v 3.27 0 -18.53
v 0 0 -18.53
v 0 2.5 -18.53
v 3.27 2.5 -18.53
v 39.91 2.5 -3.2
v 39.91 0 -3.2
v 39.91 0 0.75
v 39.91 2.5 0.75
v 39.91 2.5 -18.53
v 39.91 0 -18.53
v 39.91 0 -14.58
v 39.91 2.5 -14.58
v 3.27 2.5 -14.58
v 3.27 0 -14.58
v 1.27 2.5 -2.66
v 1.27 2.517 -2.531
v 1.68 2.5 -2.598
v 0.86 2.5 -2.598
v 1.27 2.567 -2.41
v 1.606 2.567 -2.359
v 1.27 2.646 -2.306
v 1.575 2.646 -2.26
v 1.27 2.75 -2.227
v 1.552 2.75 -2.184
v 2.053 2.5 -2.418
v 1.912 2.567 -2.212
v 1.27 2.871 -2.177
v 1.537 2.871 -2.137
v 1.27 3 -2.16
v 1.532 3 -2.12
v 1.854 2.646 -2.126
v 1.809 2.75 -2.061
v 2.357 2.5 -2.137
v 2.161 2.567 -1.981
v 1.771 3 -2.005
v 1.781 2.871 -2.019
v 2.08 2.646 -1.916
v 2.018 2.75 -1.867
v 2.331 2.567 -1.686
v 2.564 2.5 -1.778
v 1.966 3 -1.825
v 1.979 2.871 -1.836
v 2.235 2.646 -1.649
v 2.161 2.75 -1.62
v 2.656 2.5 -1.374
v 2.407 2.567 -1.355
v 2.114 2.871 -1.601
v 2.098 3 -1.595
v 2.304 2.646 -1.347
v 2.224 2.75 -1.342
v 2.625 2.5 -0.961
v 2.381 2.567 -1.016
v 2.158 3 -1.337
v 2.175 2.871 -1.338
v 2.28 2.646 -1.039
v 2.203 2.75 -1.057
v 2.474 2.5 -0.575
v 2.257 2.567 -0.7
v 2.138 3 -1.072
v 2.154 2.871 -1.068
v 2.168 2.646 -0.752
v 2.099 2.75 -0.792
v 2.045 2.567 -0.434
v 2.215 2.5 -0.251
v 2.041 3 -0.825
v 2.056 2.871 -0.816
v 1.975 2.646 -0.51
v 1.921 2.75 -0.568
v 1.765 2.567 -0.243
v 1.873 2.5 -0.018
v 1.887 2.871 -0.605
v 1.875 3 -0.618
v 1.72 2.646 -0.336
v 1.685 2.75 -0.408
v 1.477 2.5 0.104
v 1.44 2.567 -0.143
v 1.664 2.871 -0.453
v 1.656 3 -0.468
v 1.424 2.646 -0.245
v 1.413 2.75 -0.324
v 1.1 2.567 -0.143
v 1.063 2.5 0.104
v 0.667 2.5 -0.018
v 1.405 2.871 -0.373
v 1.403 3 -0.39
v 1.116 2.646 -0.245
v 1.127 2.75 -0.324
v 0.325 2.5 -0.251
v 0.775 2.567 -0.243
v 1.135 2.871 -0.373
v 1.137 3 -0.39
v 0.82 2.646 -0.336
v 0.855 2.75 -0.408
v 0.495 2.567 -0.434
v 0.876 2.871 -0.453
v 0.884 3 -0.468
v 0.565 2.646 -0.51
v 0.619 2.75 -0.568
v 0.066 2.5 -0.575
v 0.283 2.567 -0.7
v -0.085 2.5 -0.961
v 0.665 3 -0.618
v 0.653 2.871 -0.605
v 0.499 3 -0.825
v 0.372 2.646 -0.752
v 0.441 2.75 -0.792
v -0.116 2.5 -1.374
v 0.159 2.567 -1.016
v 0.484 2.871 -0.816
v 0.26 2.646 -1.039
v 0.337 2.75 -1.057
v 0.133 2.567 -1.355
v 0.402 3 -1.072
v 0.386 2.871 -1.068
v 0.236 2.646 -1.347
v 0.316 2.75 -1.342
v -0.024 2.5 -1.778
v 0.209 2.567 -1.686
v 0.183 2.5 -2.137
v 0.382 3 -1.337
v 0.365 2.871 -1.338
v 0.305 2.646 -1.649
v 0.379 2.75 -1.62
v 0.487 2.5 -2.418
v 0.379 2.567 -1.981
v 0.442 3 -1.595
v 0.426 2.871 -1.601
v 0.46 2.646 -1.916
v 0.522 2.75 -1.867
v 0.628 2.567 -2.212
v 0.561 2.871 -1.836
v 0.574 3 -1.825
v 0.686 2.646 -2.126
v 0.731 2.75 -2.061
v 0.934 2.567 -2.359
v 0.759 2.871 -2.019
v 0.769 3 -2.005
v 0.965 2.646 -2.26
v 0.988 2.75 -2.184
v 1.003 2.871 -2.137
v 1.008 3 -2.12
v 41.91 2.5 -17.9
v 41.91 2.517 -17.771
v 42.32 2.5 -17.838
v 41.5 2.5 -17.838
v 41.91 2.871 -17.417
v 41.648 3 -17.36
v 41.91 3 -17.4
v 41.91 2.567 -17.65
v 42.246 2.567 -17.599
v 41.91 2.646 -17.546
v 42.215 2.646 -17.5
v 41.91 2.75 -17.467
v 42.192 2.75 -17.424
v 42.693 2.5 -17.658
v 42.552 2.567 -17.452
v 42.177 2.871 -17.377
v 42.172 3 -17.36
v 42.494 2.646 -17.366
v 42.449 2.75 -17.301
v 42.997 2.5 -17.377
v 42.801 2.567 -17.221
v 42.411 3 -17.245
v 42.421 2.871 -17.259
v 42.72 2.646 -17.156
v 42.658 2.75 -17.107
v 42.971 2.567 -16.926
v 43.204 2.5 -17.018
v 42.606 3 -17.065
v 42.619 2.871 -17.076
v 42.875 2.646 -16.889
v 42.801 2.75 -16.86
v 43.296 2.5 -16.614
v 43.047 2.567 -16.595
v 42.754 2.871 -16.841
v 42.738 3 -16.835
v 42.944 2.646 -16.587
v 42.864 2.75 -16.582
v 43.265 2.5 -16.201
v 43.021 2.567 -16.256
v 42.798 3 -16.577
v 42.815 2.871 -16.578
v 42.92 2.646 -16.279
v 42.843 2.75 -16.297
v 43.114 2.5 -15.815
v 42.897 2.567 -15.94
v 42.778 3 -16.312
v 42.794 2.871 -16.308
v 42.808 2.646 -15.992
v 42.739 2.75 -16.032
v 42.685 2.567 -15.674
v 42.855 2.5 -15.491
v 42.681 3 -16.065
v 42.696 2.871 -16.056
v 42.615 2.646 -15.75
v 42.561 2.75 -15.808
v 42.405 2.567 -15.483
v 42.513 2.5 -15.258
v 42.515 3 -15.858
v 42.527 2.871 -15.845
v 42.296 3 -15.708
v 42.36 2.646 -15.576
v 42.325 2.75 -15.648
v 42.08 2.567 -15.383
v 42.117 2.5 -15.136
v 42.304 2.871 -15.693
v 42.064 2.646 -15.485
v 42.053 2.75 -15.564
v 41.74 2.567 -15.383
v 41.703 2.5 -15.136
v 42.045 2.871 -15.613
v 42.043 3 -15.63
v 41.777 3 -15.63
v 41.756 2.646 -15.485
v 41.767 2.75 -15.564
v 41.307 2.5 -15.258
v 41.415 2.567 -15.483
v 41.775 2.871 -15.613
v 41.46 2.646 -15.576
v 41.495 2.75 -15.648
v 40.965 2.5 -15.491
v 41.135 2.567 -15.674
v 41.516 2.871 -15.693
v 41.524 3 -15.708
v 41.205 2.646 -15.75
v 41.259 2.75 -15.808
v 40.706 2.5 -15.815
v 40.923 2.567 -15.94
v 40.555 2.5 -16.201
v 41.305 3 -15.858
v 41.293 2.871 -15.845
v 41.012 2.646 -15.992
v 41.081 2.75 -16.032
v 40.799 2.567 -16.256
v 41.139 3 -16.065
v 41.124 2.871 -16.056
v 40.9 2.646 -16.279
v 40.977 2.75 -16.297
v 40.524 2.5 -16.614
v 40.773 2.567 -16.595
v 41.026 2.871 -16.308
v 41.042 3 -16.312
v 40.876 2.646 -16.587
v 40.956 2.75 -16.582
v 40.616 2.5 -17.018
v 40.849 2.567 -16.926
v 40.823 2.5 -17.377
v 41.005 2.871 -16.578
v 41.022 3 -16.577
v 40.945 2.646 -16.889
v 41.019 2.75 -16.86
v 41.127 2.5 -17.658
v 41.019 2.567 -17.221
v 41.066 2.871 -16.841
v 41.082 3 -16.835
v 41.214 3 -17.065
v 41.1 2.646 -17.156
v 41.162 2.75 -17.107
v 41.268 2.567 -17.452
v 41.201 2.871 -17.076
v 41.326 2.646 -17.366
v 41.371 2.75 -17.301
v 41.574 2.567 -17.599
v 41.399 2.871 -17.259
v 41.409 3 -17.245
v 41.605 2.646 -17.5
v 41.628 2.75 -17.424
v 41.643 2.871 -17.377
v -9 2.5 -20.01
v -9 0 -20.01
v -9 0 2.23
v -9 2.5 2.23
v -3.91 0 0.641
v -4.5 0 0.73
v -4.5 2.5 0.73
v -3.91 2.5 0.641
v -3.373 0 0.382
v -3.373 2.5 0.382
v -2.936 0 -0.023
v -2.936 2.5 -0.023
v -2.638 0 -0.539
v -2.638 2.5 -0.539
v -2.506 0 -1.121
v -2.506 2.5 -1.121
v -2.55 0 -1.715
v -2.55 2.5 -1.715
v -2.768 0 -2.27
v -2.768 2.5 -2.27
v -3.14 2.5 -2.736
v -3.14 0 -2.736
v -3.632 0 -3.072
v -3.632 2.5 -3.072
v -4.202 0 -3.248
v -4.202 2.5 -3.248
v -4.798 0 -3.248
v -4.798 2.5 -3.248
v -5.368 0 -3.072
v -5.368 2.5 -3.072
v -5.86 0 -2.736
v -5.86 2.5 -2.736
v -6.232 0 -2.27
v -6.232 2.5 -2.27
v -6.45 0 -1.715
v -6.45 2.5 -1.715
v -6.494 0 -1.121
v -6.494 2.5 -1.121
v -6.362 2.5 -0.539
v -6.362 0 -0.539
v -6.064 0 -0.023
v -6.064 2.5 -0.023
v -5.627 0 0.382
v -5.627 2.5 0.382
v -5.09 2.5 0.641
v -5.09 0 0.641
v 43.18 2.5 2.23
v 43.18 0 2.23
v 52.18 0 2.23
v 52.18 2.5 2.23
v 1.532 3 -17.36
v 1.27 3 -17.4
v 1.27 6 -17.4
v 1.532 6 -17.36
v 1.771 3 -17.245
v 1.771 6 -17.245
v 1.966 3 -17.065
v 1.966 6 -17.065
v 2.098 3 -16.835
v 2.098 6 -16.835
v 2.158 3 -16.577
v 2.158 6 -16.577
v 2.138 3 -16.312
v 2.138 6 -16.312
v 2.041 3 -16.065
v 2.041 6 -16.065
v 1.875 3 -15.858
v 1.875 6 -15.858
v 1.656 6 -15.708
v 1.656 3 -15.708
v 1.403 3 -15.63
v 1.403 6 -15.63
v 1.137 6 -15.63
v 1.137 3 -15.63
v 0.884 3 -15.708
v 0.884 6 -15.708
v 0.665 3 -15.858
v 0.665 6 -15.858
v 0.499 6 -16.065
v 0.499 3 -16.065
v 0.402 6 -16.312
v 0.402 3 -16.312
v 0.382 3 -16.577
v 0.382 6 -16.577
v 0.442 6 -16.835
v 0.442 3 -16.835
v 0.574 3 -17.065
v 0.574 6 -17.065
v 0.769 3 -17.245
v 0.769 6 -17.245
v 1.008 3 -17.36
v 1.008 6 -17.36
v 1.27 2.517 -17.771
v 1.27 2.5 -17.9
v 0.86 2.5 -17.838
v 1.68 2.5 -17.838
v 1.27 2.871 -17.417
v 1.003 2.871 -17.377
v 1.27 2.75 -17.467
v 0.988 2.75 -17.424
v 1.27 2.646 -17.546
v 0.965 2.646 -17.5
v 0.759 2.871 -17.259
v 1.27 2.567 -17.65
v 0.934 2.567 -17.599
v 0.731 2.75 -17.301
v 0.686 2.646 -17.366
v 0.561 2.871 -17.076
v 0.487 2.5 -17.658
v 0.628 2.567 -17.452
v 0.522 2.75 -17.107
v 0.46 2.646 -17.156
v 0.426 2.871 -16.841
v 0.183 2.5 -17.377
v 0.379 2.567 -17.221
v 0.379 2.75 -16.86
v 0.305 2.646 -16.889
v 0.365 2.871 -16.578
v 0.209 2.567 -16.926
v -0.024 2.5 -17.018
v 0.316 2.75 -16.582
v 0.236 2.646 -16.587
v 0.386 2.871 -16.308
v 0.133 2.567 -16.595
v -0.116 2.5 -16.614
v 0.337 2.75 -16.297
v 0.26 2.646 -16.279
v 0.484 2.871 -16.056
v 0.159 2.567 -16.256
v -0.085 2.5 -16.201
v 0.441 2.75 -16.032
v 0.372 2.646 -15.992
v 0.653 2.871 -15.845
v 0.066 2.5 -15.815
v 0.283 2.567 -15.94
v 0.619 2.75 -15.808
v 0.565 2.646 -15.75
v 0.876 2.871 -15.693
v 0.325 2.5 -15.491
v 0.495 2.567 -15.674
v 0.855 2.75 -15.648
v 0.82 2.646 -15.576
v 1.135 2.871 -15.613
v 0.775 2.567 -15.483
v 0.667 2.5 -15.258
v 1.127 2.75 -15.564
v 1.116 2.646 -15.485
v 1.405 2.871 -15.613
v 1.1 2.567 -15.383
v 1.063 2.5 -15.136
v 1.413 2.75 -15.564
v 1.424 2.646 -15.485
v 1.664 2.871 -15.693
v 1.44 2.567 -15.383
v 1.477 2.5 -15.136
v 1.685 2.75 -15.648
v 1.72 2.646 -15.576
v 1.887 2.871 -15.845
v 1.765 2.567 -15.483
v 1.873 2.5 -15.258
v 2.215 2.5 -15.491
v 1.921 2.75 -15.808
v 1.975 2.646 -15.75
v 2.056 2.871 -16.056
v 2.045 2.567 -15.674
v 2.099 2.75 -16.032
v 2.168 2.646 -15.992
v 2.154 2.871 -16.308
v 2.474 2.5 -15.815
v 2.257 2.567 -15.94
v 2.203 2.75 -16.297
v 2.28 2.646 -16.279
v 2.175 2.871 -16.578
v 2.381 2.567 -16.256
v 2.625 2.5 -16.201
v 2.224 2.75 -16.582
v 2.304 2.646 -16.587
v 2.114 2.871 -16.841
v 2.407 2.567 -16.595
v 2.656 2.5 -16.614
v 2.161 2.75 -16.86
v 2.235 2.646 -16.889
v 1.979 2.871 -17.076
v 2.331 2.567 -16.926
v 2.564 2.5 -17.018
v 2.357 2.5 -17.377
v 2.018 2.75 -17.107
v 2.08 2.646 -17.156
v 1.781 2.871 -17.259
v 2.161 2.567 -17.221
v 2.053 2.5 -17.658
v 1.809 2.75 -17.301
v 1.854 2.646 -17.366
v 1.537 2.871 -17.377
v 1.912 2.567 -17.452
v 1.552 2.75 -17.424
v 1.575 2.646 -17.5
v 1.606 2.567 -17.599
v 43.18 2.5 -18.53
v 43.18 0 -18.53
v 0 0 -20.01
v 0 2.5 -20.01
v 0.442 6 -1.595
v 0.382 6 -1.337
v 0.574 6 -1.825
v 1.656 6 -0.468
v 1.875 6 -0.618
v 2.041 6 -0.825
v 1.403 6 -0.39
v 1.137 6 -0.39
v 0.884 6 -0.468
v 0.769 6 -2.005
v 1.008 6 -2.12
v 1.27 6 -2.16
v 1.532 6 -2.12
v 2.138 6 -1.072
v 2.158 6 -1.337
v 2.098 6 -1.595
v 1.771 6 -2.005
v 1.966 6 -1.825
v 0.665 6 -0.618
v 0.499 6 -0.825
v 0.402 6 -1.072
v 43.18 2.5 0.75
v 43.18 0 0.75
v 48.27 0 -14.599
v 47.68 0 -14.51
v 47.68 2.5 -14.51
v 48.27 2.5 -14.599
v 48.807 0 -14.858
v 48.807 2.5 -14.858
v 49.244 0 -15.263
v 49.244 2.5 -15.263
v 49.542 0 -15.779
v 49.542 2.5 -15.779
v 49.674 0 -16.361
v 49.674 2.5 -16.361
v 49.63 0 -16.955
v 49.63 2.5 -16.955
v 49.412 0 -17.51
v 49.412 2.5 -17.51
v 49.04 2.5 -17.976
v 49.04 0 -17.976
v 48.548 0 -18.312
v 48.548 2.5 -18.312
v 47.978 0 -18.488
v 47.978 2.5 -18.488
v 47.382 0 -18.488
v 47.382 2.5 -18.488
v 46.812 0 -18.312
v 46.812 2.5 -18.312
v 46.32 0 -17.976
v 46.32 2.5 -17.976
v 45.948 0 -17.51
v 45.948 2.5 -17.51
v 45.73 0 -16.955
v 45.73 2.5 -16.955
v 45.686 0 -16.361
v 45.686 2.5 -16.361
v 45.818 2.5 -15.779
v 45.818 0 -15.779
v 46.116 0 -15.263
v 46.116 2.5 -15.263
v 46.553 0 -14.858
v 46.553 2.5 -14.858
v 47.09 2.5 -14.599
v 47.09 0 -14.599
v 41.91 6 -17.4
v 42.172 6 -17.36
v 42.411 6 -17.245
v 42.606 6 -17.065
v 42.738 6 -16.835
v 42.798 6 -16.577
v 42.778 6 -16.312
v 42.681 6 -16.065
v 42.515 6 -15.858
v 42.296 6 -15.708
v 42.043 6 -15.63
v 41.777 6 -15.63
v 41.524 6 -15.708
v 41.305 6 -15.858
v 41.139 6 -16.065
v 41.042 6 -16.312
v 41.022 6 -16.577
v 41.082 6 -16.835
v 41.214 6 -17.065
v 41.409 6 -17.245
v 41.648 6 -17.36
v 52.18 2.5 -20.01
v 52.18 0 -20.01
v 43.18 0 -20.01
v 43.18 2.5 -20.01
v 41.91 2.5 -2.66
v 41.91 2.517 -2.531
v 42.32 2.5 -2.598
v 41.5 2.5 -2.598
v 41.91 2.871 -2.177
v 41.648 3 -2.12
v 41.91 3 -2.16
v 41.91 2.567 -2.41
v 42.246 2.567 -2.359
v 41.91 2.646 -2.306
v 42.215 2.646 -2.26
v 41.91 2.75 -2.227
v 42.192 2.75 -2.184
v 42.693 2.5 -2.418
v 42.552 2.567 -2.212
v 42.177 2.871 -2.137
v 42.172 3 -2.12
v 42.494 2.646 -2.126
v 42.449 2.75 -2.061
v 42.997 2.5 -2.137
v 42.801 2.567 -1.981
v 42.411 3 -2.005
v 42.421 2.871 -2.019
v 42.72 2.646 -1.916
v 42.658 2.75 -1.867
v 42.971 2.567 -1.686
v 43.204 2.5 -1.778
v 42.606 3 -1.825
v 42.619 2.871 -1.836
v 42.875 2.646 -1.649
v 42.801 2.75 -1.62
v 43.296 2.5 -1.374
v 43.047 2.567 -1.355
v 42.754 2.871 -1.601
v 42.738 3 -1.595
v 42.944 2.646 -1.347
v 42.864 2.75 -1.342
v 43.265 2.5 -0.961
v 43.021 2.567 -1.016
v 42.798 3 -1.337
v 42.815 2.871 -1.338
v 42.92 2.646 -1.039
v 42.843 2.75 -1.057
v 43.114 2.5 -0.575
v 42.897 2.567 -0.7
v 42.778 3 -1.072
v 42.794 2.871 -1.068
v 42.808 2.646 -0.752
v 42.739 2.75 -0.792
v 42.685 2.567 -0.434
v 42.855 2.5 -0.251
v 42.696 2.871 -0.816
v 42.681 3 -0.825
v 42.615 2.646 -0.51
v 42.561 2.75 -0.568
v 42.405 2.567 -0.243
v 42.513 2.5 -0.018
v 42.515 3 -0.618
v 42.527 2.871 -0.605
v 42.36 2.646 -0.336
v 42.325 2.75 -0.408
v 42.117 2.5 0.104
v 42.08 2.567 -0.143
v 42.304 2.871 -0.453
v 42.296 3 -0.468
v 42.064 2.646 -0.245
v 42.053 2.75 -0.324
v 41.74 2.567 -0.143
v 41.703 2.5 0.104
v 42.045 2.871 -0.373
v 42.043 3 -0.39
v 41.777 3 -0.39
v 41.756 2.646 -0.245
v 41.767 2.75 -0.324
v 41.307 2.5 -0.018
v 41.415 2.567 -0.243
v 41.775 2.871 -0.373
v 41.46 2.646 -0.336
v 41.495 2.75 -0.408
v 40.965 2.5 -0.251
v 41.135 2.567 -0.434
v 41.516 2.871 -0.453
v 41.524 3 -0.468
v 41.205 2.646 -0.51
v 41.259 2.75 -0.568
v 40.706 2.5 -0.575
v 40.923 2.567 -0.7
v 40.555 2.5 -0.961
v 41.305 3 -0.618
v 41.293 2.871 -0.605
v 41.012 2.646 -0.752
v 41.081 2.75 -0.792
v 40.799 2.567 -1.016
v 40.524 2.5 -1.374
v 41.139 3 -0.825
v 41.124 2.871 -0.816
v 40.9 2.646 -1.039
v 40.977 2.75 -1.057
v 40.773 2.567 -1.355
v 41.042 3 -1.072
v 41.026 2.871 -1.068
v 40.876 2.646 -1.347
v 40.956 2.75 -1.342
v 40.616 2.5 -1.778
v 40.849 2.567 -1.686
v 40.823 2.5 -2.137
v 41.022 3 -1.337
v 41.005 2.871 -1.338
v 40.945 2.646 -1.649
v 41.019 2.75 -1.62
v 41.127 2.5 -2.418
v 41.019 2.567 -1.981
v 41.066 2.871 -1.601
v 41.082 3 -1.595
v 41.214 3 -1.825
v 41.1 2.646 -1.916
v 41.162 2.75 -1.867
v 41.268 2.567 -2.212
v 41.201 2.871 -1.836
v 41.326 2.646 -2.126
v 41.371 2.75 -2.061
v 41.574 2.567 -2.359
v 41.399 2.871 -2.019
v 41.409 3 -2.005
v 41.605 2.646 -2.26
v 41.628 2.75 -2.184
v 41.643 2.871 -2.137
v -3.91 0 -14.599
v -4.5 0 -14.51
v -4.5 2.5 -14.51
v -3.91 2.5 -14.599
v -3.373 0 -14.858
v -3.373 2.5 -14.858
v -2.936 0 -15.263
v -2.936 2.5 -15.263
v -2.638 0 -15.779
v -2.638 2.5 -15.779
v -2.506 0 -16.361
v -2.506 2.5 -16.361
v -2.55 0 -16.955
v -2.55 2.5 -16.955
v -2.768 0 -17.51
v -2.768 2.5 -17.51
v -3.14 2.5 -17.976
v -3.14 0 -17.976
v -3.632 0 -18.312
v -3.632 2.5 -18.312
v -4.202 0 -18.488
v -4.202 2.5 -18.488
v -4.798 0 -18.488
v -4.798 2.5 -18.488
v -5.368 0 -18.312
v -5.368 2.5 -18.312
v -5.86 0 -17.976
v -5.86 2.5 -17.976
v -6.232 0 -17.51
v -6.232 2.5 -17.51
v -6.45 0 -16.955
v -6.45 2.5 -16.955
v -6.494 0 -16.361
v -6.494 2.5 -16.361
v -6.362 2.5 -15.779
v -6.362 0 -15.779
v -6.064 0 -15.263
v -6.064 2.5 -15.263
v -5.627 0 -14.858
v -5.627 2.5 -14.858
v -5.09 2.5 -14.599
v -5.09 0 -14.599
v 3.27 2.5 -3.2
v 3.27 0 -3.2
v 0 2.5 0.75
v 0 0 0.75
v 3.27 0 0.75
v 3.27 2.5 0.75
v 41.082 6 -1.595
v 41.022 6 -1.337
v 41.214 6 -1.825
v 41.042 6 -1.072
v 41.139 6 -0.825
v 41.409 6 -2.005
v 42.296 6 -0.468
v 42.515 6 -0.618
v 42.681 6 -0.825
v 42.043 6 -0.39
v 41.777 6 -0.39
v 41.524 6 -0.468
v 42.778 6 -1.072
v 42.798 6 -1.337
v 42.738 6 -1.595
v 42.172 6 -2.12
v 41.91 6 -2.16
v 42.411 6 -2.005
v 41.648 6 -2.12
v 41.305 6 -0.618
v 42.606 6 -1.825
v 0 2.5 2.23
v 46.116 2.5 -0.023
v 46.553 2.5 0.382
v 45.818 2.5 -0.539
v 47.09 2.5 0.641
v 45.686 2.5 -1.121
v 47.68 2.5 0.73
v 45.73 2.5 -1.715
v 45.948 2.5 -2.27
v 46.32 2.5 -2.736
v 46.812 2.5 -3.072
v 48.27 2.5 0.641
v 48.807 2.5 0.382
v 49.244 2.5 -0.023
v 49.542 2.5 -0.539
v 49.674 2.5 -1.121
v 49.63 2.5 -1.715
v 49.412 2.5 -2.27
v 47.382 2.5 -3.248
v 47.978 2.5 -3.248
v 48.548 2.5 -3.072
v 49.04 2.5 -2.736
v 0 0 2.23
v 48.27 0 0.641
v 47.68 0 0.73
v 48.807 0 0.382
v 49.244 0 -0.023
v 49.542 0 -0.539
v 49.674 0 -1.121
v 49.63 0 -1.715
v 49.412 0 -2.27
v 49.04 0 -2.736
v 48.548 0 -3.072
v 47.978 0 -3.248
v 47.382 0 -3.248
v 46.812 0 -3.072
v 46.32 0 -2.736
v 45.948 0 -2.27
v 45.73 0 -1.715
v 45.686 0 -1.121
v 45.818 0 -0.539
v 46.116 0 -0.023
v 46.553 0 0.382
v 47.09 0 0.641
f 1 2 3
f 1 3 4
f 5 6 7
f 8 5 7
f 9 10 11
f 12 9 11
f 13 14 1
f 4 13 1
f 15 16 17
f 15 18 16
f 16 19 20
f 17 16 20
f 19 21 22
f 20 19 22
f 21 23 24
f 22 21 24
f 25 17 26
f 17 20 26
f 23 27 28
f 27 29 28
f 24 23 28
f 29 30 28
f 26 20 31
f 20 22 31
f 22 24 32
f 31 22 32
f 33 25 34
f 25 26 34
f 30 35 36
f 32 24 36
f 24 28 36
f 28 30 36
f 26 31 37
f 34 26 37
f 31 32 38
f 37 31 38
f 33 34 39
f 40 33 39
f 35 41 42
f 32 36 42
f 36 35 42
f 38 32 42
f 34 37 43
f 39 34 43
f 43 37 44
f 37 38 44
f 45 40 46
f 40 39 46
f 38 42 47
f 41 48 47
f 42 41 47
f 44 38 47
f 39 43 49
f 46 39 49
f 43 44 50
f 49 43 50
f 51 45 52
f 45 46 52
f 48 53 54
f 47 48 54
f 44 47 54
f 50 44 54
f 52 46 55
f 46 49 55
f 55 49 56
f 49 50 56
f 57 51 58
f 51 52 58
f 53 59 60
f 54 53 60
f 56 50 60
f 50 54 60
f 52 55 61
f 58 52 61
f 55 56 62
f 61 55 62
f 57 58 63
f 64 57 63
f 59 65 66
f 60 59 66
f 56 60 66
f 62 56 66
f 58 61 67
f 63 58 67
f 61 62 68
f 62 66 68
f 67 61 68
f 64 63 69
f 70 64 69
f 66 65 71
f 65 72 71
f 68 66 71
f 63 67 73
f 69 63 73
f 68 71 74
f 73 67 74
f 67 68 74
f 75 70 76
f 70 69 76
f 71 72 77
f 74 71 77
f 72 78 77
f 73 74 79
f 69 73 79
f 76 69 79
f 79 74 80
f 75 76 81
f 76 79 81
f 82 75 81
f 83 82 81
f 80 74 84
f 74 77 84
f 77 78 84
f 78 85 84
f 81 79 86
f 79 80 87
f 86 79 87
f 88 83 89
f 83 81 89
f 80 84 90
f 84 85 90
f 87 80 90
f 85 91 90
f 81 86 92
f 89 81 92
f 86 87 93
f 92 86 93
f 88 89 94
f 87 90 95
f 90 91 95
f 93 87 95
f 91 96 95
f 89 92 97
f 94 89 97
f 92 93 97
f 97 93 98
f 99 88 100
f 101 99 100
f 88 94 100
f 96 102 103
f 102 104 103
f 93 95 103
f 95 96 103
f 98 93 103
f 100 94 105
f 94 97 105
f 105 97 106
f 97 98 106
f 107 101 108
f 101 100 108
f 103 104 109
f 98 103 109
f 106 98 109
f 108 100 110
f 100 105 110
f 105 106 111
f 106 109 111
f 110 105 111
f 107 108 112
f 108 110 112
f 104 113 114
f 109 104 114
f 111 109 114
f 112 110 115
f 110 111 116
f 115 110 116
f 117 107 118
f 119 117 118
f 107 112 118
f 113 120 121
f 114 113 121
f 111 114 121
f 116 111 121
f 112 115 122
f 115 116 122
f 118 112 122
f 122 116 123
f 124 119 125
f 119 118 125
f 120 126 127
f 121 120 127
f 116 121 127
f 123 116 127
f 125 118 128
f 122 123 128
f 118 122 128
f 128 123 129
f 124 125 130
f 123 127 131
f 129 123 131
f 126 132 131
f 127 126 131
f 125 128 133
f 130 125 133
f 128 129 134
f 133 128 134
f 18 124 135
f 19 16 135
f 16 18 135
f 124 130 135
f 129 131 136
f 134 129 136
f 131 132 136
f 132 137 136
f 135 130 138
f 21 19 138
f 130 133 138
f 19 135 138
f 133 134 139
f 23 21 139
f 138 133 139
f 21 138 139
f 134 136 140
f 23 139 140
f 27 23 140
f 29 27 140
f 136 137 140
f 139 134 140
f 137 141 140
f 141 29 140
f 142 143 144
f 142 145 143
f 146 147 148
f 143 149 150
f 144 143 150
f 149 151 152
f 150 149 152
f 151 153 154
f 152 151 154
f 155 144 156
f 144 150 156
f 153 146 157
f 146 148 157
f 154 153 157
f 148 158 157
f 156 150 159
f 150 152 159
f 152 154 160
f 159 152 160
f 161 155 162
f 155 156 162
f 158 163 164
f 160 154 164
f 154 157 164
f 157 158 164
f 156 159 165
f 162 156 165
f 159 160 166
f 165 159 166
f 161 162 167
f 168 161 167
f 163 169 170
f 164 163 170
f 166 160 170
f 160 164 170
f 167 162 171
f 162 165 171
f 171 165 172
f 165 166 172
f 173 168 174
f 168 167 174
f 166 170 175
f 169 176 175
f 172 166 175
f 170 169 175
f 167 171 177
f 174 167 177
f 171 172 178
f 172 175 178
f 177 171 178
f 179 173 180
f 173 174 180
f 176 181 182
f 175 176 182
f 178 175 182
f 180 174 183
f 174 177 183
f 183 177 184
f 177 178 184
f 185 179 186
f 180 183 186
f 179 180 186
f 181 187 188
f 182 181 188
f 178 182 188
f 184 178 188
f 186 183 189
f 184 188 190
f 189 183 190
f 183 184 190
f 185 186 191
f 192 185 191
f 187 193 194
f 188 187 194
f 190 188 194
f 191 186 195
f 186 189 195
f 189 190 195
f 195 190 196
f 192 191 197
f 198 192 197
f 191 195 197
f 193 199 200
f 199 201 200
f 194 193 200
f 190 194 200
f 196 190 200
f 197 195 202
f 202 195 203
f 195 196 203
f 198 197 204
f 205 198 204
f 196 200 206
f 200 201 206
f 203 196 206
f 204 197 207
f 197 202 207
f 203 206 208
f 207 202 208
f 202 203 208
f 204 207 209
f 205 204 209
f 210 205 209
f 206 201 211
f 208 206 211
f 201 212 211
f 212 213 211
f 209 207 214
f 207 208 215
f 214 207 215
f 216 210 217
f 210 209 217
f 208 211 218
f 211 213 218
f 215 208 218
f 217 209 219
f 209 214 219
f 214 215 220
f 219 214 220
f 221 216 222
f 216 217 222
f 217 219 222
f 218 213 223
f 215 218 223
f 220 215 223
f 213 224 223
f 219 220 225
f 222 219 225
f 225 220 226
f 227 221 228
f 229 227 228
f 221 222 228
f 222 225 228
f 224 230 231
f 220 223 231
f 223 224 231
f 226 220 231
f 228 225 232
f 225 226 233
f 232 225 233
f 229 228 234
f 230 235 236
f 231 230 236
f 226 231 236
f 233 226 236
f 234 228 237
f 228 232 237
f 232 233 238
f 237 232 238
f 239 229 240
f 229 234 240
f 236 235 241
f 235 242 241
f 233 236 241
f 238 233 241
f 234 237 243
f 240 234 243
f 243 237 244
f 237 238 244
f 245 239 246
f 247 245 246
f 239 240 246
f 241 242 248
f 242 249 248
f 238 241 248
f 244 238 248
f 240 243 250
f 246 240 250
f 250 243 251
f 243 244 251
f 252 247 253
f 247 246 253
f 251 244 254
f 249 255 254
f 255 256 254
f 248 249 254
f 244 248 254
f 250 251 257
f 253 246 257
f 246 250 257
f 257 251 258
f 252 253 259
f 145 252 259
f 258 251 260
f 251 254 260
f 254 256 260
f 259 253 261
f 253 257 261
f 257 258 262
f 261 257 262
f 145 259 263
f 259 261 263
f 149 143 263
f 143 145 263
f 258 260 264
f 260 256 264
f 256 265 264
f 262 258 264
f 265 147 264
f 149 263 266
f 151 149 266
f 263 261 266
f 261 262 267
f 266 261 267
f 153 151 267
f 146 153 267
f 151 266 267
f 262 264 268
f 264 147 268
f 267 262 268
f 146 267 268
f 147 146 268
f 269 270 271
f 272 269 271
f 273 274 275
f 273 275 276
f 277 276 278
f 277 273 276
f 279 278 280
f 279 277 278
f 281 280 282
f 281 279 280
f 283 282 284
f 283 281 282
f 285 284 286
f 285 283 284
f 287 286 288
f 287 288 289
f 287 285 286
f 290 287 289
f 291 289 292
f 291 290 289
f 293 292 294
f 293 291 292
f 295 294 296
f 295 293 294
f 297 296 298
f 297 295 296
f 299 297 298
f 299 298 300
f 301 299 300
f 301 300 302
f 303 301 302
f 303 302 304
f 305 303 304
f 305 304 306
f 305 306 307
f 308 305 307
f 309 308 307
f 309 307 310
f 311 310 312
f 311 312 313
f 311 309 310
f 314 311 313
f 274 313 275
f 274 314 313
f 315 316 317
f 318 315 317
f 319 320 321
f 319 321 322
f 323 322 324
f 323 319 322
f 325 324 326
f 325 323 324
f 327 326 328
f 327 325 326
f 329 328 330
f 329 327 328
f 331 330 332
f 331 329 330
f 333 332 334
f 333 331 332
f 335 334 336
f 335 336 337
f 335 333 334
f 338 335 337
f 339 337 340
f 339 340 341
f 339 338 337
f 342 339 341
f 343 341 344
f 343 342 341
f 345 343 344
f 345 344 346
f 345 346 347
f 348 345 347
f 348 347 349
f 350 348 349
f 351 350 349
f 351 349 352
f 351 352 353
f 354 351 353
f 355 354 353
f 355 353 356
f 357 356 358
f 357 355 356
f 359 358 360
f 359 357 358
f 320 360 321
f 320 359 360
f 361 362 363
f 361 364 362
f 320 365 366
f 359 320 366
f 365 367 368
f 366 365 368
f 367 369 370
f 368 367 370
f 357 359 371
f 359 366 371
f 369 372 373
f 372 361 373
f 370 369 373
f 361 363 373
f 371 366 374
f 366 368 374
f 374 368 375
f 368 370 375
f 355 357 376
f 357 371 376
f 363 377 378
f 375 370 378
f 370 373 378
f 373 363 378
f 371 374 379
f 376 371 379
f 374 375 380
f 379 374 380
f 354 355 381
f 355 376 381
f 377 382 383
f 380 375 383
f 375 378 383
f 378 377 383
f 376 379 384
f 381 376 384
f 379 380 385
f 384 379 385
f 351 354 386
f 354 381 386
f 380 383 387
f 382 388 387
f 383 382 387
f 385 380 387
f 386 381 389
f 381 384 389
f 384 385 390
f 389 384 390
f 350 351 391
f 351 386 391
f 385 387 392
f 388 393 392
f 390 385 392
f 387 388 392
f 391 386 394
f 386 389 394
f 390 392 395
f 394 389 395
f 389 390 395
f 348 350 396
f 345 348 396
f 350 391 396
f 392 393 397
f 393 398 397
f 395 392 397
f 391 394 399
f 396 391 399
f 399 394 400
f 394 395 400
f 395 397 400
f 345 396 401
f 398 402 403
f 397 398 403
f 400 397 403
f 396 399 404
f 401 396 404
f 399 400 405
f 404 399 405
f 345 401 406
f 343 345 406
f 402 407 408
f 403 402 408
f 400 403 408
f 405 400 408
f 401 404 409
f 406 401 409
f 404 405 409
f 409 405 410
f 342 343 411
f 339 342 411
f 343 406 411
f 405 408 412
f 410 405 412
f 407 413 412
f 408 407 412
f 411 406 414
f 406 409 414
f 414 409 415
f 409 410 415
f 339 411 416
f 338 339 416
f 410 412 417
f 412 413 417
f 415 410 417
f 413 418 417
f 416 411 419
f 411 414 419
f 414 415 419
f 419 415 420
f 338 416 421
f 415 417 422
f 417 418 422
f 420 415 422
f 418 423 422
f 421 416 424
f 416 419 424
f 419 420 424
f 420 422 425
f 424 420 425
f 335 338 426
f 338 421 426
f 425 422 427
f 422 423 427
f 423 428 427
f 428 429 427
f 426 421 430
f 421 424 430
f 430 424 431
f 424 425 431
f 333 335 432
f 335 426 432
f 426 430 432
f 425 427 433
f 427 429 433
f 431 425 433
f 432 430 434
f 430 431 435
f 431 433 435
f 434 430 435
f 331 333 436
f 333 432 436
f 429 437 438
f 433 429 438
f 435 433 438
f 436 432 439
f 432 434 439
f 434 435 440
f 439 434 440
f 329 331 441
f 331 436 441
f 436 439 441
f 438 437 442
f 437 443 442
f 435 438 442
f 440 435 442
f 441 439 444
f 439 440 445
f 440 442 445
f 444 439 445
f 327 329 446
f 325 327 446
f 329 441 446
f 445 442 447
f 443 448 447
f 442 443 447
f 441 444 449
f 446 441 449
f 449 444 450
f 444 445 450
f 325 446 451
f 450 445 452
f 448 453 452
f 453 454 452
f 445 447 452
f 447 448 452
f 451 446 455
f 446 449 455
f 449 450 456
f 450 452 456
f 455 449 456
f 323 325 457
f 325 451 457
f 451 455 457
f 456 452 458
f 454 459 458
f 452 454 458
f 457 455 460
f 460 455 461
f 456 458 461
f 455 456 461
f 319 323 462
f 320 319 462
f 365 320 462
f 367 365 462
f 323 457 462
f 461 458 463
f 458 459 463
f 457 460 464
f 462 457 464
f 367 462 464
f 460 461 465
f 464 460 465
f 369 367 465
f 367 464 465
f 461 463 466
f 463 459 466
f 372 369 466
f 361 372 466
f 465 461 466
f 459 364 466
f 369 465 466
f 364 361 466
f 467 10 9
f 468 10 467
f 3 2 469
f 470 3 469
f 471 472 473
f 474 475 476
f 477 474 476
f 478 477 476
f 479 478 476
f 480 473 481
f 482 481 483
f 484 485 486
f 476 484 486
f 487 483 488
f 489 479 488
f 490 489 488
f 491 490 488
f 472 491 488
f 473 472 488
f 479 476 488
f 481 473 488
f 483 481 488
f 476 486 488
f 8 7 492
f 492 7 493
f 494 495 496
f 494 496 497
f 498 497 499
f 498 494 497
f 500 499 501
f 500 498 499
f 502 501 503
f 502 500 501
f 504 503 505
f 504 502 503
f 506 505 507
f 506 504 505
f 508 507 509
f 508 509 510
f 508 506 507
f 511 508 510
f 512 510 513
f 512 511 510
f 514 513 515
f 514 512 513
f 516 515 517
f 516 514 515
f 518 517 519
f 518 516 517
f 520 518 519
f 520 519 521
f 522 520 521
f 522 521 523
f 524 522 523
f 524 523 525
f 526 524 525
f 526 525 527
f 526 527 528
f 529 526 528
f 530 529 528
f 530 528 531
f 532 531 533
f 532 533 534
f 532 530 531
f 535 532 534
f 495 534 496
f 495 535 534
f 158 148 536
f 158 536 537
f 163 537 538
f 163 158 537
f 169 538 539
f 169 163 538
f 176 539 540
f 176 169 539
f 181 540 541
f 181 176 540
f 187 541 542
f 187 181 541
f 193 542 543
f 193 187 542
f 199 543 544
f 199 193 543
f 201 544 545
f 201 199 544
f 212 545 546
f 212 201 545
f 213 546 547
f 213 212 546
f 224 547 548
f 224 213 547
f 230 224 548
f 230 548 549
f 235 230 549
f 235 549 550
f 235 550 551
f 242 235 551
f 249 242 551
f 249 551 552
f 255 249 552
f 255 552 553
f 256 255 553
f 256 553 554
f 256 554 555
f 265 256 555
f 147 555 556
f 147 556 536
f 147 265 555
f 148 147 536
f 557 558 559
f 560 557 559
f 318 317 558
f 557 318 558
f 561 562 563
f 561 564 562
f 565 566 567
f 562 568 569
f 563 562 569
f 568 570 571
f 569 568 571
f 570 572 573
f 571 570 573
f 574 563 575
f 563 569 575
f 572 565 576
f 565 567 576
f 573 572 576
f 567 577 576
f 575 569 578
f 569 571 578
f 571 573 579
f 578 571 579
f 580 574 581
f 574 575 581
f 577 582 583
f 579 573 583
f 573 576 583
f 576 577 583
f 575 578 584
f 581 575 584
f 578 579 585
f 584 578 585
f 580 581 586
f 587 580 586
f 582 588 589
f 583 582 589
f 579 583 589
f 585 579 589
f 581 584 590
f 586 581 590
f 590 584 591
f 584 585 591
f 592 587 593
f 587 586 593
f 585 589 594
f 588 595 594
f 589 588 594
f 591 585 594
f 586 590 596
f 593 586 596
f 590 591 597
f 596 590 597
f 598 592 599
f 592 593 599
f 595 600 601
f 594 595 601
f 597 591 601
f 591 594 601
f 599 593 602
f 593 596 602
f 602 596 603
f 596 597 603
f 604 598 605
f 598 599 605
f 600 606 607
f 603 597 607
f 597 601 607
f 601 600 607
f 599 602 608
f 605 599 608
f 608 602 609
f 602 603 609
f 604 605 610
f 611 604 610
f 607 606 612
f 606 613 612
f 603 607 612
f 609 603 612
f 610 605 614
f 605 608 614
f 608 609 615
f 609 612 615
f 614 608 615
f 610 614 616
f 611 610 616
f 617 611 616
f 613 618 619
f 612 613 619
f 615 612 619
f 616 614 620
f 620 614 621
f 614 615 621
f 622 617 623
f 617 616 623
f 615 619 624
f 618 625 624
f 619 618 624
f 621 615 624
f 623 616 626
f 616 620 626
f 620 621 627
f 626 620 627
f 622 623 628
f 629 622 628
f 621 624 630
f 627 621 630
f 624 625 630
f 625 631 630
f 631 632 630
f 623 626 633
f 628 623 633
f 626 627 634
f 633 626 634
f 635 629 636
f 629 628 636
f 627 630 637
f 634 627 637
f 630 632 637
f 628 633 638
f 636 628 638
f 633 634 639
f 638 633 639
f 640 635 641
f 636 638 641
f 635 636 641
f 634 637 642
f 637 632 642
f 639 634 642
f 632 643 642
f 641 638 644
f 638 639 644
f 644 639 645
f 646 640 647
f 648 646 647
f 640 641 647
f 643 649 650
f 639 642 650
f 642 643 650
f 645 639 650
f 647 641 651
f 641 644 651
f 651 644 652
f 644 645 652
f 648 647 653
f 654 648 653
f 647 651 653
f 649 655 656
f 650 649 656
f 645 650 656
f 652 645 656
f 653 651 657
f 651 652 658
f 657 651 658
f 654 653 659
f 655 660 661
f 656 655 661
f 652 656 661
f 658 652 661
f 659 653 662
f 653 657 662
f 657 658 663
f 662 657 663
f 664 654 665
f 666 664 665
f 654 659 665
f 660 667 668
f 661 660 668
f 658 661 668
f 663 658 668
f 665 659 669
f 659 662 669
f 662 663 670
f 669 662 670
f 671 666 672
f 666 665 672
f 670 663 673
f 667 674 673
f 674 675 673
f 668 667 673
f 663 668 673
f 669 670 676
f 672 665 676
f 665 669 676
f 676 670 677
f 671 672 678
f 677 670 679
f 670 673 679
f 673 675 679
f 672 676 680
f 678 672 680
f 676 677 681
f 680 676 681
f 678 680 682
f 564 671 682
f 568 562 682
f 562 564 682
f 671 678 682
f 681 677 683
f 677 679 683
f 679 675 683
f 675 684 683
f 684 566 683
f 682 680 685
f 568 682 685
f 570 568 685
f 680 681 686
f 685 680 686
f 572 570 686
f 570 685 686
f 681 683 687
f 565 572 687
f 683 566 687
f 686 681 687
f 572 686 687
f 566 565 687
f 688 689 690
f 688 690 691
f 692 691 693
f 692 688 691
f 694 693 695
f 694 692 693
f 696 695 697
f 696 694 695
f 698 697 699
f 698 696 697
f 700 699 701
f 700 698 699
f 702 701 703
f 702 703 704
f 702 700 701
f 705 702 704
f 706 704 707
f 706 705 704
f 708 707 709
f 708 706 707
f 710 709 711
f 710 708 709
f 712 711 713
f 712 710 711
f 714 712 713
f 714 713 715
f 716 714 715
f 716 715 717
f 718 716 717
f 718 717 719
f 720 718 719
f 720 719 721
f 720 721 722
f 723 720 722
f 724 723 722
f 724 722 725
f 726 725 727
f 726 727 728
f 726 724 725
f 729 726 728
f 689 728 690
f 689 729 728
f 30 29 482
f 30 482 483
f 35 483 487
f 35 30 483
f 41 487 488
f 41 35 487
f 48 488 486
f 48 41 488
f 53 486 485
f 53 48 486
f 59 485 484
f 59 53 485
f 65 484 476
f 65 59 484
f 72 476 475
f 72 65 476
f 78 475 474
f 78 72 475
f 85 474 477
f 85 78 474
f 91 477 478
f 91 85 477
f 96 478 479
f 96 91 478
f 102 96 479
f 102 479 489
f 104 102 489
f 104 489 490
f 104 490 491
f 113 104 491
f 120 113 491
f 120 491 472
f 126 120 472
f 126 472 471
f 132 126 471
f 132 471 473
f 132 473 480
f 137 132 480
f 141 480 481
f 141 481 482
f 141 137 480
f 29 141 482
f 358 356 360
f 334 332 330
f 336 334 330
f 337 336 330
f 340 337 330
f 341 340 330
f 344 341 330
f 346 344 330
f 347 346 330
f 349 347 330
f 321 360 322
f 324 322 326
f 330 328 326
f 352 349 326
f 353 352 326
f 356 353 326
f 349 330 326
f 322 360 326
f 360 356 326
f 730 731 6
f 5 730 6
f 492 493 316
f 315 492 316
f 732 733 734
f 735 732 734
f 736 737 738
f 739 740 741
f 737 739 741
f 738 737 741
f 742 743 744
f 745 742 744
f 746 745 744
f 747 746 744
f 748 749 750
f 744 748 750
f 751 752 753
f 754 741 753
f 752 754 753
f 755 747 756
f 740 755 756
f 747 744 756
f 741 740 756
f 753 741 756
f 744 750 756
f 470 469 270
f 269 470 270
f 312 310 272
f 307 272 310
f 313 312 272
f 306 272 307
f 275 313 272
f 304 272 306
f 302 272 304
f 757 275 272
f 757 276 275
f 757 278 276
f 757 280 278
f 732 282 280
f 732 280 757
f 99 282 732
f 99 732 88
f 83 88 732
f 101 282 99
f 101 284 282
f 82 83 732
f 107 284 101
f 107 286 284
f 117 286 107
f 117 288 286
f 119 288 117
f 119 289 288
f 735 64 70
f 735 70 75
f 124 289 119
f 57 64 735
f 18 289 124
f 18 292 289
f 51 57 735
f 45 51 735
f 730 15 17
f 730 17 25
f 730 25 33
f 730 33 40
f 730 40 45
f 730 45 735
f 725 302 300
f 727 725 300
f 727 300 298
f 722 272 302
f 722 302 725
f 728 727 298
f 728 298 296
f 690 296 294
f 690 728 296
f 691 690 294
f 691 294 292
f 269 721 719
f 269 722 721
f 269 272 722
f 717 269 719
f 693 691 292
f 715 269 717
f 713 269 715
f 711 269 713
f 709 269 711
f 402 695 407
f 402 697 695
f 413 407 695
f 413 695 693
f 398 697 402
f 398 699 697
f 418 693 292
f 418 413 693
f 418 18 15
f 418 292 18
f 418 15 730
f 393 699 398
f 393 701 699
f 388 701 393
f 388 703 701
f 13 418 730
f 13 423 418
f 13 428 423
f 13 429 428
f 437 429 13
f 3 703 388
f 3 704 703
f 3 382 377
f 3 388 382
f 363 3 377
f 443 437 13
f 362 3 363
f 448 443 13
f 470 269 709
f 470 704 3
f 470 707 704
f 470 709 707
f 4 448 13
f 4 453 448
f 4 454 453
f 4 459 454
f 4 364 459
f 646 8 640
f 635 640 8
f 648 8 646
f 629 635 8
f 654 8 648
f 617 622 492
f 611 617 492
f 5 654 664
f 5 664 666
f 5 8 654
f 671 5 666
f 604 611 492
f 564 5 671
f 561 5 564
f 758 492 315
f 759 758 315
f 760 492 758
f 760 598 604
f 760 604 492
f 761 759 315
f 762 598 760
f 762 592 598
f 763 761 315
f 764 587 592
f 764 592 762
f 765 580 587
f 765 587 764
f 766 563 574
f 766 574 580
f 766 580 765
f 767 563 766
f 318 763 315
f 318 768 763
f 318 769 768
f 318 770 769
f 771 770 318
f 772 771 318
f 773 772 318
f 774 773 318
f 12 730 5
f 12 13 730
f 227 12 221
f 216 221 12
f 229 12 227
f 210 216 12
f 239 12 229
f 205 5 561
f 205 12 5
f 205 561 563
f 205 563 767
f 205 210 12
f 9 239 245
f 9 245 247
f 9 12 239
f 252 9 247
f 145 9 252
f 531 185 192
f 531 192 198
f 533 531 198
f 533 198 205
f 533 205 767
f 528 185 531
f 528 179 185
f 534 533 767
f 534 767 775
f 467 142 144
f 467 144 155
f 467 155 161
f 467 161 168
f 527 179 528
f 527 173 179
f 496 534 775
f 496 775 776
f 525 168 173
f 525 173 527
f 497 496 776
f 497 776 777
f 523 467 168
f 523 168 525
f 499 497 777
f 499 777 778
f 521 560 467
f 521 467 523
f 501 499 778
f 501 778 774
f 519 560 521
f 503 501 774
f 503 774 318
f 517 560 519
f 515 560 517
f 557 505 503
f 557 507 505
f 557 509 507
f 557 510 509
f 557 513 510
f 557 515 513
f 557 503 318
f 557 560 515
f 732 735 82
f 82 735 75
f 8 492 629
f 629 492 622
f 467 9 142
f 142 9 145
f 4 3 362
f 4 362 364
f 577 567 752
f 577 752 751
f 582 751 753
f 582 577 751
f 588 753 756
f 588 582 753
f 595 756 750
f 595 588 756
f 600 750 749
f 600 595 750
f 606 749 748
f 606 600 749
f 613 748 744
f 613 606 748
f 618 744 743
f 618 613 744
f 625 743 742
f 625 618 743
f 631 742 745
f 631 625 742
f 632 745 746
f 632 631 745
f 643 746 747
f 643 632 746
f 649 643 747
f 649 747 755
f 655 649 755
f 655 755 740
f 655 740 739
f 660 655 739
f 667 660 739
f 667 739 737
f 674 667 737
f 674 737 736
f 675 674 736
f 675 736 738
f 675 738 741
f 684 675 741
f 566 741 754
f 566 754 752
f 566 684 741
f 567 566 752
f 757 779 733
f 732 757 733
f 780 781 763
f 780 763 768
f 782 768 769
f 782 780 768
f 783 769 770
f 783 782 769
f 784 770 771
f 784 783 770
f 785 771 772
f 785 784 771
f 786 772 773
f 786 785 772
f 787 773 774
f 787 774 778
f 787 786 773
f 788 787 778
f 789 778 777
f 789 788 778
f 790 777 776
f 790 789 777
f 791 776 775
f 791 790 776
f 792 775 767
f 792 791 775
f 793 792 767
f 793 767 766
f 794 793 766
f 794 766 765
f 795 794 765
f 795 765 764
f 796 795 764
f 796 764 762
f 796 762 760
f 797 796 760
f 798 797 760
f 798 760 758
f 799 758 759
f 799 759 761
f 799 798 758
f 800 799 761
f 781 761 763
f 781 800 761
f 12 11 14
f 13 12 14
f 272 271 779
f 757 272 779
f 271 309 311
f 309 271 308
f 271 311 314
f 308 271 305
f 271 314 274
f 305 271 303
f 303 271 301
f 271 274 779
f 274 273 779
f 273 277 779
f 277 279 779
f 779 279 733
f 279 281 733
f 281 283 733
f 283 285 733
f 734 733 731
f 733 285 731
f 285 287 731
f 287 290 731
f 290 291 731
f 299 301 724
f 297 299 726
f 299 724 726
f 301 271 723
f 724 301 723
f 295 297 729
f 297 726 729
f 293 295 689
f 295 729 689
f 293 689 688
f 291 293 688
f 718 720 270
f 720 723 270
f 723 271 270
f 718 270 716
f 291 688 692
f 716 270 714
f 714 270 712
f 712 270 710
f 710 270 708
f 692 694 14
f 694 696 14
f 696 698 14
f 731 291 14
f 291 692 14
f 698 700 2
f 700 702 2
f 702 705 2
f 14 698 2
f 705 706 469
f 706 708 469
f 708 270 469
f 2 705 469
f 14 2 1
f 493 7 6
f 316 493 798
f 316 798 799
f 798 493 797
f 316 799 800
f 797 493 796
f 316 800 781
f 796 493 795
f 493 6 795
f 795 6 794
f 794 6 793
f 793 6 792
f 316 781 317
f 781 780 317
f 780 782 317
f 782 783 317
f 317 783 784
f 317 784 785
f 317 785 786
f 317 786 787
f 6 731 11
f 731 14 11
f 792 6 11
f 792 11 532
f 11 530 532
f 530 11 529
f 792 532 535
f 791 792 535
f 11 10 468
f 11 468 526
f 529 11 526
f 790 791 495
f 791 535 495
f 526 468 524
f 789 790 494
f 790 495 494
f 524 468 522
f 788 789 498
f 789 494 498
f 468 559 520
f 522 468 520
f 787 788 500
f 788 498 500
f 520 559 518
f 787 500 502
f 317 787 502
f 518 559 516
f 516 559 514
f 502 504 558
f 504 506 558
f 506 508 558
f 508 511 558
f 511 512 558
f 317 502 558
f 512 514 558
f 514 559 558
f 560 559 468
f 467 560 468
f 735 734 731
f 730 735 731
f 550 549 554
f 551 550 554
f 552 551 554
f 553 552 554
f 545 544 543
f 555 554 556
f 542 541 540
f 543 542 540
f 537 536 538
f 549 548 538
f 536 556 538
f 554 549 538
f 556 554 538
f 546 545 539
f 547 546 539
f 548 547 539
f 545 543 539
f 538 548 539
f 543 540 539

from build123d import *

# Parameters (mm, degrees)
SKETCH1_R           = 0.89
SKETCH1_R_2         = 2
SKETCH1_W           = 3.27
SKETCH1_H           = 0.75
BOSS_EXTRUDE1_DEPTH = 2.5
SKETCH2_R           = 0.89
BOSS_EXTRUDE2_DEPTH = 6
FILLET1_R           = 0.5


with BuildPart() as part:
    # Sketch1 → Boss-Extrude1 (new body)
    # profile 1 of 7: a face of its own
    with BuildSketch(Plane(origin=(0, 0, 0), x_dir=(1, 0, 0), z_dir=(0, 1, 0))):
        Polygon((0, 17.78), (0, 0), (3.27, 0), (3.27, 3.2), (39.91, 3.2), (39.91, 0), (43.18, 0), (43.18, 17.78), (39.91, 17.78), (39.91, 14.58), (3.27, 14.58), (3.27, 17.78), align=None)
        with Locations(Location((1.27, 1.27, 0), (0, 0, 270))):
            Circle(SKETCH1_R, mode=Mode.SUBTRACT)
        with Locations(Location((41.91, 1.27, 0), (0, 0, 270))):
            Circle(SKETCH1_R, mode=Mode.SUBTRACT)
        with Locations(Location((1.27, 16.51, 0), (0, 0, 270))):
            Circle(SKETCH1_R, mode=Mode.SUBTRACT)
        with Locations(Location((41.91, 16.51, 0), (0, 0, 270))):
            Circle(SKETCH1_R, mode=Mode.SUBTRACT)
    # profile 2 of 7: a face of its own
    with BuildSketch(Plane(origin=(0, 0, 0), x_dir=(1, 0, 0), z_dir=(0, 1, 0))):
        Polygon((0, -0.75), (0, 0), (0, 17.78), (0, 18.53), (0, 20.01), (-9, 20.01), (-9, -2.23), (0, -2.23), align=None)
        with Locations(Location((-4.5, 1.27, 0), (0, 0, 270))):
            Circle(SKETCH1_R_2, mode=Mode.SUBTRACT)
        with Locations(Location((-4.5, 16.51, 0), (0, 0, 270))):
            Circle(SKETCH1_R_2, mode=Mode.SUBTRACT)
    # profile 3 of 7: a face of its own
    with BuildSketch(Plane(origin=(0, 0, 0), x_dir=(1, 0, 0), z_dir=(0, 1, 0))):
        Polygon((43.18, 17.78), (43.18, 0), (43.18, -0.75), (43.18, -2.23), (52.18, -2.23), (52.18, 20.01), (43.18, 20.01), (43.18, 18.53), align=None)
        with Locations(Location((47.68, 1.27, 0), (0, 0, 270))):
            Circle(SKETCH1_R_2, mode=Mode.SUBTRACT)
        with Locations(Location((47.68, 16.51, 0), (0, 0, 270))):
            Circle(SKETCH1_R_2, mode=Mode.SUBTRACT)
    # profile 4 of 7: a face of its own
    with BuildSketch(Plane(origin=(0, 0, 0), x_dir=(1, 0, 0), z_dir=(0, 1, 0))):
        with Locations((41.545, -0.375)):
            Rectangle(SKETCH1_W, SKETCH1_H)
    # profile 5 of 7: a face of its own
    with BuildSketch(Plane(origin=(0, 0, 0), x_dir=(1, 0, 0), z_dir=(0, 1, 0))):
        with Locations((41.545, 18.155)):
            Rectangle(SKETCH1_W, SKETCH1_H)
    # profile 6 of 7: a face of its own
    with BuildSketch(Plane(origin=(0, 0, 0), x_dir=(1, 0, 0), z_dir=(0, 1, 0))):
        with Locations((1.635, 18.155)):
            Rectangle(SKETCH1_W, SKETCH1_H)
    # profile 7 of 7: a face of its own
    with BuildSketch(Plane(origin=(0, 0, 0), x_dir=(1, 0, 0), z_dir=(0, 1, 0))):
        with Locations((1.635, -0.375)):
            Rectangle(SKETCH1_W, SKETCH1_H)
    extrude(amount=BOSS_EXTRUDE1_DEPTH)

    # Sketch2 → Boss-Extrude2 (add)
    with BuildSketch(Plane.XZ):
        with Locations(Location((1.27, -16.51, 0), (0, 0, 270))):
            Circle(SKETCH2_R)
        with Locations(Location((1.27, -1.27, 0), (0, 0, 270))):
            Circle(SKETCH2_R)
        with Locations(Location((41.91, -16.51, 0), (0, 0, 270))):
            Circle(SKETCH2_R)
        with Locations(Location((41.91, -1.27, 0), (0, 0, 270))):
            Circle(SKETCH2_R)
    extrude(amount=-BOSS_EXTRUDE2_DEPTH)

    # Fillet1
    fillet1_edges = [part.edges().sort_by_distance(p)[0] for p in [
        (41.91, 2.5, -0.38),
        (41.91, 2.5, -15.62),
        (1.27, 2.5, -0.38),
        (1.27, 2.5, -15.62),
    ]]
    fillet(fillet1_edges, radius=FILLET1_R)


solid = part.part
